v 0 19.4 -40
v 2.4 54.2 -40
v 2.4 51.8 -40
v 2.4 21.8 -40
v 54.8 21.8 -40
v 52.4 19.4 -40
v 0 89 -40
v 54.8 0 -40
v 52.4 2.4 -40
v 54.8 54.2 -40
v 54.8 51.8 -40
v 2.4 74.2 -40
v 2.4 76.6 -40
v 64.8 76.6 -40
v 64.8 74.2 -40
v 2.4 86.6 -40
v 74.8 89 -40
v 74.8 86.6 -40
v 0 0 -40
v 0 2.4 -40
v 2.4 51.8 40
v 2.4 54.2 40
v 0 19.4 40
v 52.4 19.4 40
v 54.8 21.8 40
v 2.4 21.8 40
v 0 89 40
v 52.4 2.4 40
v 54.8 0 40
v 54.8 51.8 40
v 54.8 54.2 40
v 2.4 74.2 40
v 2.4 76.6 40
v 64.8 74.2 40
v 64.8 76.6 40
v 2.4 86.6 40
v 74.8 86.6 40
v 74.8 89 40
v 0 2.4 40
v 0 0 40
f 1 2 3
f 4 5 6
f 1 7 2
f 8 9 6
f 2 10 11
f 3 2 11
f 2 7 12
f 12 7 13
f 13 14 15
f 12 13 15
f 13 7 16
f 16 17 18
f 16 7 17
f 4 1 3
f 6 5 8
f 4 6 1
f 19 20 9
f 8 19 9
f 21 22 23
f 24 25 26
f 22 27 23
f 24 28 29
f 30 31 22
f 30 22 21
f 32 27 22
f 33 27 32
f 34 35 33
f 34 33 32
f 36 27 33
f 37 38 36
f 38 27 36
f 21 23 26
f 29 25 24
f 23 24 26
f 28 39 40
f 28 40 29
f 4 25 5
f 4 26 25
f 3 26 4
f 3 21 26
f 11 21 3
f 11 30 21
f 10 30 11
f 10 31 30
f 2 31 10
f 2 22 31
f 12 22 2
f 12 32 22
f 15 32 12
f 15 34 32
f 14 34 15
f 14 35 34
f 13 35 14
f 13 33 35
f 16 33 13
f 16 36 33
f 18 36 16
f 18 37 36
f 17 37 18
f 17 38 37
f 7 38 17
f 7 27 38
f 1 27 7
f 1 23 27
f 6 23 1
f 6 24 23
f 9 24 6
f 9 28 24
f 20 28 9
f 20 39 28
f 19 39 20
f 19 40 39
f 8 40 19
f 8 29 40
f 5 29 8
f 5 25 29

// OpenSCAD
// thickness of the parent shelf we will hang on
shelfThickness = 17;

// general thickness of the shelves
thickness = 2.4;

// how deep into our parent shelf 
depth = 50;

width = 80;



// ultimate: width 90, s1height=16, s2height=22, s3height=??
// but need holes/space in back for routing cables.

module hangingShelf(
    t=thickness, d=depth, w=width,
    
    // Usable height of each shelf
    s1height = 30, s2height = 20, s3height = 10,
    
    // offsets control how far out the shelf will stick
    // compared to the part that slides onto the parent
    // shelf. Use negative numbers to inset.
    s1Offset = 0, s2Offset = 10, s3Offset = 20) 
{
    x0 = 0;
    x1 = t;
    x2 = t + d;
    x3 = t + d + t;
    y0 = 0;
    y1 = t + shelfThickness + t;
    s1y = shelfThickness + t + t + s1height;
    s2y = s1y + t + s2height;
    s3y = s2y + t + s3height;
    
    poly = [
        [x0,y0],  // 0
        [x3,y0],  // 1
        [x3,y1], // 2
        [x1,y1], // 3
        [x1,s1y], // 4
        [x3+s1Offset,s1y],  // 5
        [x3+s1Offset,s1y+t], // 6
        [x1,s1y+t], // 7
        [x1,s2y], // 8
        [x3+s2Offset,s2y], // 9
        [x3+s2Offset,s2y+t], // 10
        [x1,s2y+t], // 11
        [x1,s3y], // 12
        [x3+s3Offset,s3y], // 13
        [x3+s3Offset,s3y+t], // 14
        [x0,s3y+t], // 15
        [x0,y0+t+shelfThickness], // 16
        [x2,y0+t+shelfThickness], // 17
        [x2, t], // 18
        [x0,t]];// 19    
    
    linear_extrude(height=w,convexity=10, center=true) 
        polygon(poly,[[0,1,2,3,4,5,6,7,8,9,10,11,12,13,14,15,16,17,18,19,0]]);
        
}


hangingShelf();
